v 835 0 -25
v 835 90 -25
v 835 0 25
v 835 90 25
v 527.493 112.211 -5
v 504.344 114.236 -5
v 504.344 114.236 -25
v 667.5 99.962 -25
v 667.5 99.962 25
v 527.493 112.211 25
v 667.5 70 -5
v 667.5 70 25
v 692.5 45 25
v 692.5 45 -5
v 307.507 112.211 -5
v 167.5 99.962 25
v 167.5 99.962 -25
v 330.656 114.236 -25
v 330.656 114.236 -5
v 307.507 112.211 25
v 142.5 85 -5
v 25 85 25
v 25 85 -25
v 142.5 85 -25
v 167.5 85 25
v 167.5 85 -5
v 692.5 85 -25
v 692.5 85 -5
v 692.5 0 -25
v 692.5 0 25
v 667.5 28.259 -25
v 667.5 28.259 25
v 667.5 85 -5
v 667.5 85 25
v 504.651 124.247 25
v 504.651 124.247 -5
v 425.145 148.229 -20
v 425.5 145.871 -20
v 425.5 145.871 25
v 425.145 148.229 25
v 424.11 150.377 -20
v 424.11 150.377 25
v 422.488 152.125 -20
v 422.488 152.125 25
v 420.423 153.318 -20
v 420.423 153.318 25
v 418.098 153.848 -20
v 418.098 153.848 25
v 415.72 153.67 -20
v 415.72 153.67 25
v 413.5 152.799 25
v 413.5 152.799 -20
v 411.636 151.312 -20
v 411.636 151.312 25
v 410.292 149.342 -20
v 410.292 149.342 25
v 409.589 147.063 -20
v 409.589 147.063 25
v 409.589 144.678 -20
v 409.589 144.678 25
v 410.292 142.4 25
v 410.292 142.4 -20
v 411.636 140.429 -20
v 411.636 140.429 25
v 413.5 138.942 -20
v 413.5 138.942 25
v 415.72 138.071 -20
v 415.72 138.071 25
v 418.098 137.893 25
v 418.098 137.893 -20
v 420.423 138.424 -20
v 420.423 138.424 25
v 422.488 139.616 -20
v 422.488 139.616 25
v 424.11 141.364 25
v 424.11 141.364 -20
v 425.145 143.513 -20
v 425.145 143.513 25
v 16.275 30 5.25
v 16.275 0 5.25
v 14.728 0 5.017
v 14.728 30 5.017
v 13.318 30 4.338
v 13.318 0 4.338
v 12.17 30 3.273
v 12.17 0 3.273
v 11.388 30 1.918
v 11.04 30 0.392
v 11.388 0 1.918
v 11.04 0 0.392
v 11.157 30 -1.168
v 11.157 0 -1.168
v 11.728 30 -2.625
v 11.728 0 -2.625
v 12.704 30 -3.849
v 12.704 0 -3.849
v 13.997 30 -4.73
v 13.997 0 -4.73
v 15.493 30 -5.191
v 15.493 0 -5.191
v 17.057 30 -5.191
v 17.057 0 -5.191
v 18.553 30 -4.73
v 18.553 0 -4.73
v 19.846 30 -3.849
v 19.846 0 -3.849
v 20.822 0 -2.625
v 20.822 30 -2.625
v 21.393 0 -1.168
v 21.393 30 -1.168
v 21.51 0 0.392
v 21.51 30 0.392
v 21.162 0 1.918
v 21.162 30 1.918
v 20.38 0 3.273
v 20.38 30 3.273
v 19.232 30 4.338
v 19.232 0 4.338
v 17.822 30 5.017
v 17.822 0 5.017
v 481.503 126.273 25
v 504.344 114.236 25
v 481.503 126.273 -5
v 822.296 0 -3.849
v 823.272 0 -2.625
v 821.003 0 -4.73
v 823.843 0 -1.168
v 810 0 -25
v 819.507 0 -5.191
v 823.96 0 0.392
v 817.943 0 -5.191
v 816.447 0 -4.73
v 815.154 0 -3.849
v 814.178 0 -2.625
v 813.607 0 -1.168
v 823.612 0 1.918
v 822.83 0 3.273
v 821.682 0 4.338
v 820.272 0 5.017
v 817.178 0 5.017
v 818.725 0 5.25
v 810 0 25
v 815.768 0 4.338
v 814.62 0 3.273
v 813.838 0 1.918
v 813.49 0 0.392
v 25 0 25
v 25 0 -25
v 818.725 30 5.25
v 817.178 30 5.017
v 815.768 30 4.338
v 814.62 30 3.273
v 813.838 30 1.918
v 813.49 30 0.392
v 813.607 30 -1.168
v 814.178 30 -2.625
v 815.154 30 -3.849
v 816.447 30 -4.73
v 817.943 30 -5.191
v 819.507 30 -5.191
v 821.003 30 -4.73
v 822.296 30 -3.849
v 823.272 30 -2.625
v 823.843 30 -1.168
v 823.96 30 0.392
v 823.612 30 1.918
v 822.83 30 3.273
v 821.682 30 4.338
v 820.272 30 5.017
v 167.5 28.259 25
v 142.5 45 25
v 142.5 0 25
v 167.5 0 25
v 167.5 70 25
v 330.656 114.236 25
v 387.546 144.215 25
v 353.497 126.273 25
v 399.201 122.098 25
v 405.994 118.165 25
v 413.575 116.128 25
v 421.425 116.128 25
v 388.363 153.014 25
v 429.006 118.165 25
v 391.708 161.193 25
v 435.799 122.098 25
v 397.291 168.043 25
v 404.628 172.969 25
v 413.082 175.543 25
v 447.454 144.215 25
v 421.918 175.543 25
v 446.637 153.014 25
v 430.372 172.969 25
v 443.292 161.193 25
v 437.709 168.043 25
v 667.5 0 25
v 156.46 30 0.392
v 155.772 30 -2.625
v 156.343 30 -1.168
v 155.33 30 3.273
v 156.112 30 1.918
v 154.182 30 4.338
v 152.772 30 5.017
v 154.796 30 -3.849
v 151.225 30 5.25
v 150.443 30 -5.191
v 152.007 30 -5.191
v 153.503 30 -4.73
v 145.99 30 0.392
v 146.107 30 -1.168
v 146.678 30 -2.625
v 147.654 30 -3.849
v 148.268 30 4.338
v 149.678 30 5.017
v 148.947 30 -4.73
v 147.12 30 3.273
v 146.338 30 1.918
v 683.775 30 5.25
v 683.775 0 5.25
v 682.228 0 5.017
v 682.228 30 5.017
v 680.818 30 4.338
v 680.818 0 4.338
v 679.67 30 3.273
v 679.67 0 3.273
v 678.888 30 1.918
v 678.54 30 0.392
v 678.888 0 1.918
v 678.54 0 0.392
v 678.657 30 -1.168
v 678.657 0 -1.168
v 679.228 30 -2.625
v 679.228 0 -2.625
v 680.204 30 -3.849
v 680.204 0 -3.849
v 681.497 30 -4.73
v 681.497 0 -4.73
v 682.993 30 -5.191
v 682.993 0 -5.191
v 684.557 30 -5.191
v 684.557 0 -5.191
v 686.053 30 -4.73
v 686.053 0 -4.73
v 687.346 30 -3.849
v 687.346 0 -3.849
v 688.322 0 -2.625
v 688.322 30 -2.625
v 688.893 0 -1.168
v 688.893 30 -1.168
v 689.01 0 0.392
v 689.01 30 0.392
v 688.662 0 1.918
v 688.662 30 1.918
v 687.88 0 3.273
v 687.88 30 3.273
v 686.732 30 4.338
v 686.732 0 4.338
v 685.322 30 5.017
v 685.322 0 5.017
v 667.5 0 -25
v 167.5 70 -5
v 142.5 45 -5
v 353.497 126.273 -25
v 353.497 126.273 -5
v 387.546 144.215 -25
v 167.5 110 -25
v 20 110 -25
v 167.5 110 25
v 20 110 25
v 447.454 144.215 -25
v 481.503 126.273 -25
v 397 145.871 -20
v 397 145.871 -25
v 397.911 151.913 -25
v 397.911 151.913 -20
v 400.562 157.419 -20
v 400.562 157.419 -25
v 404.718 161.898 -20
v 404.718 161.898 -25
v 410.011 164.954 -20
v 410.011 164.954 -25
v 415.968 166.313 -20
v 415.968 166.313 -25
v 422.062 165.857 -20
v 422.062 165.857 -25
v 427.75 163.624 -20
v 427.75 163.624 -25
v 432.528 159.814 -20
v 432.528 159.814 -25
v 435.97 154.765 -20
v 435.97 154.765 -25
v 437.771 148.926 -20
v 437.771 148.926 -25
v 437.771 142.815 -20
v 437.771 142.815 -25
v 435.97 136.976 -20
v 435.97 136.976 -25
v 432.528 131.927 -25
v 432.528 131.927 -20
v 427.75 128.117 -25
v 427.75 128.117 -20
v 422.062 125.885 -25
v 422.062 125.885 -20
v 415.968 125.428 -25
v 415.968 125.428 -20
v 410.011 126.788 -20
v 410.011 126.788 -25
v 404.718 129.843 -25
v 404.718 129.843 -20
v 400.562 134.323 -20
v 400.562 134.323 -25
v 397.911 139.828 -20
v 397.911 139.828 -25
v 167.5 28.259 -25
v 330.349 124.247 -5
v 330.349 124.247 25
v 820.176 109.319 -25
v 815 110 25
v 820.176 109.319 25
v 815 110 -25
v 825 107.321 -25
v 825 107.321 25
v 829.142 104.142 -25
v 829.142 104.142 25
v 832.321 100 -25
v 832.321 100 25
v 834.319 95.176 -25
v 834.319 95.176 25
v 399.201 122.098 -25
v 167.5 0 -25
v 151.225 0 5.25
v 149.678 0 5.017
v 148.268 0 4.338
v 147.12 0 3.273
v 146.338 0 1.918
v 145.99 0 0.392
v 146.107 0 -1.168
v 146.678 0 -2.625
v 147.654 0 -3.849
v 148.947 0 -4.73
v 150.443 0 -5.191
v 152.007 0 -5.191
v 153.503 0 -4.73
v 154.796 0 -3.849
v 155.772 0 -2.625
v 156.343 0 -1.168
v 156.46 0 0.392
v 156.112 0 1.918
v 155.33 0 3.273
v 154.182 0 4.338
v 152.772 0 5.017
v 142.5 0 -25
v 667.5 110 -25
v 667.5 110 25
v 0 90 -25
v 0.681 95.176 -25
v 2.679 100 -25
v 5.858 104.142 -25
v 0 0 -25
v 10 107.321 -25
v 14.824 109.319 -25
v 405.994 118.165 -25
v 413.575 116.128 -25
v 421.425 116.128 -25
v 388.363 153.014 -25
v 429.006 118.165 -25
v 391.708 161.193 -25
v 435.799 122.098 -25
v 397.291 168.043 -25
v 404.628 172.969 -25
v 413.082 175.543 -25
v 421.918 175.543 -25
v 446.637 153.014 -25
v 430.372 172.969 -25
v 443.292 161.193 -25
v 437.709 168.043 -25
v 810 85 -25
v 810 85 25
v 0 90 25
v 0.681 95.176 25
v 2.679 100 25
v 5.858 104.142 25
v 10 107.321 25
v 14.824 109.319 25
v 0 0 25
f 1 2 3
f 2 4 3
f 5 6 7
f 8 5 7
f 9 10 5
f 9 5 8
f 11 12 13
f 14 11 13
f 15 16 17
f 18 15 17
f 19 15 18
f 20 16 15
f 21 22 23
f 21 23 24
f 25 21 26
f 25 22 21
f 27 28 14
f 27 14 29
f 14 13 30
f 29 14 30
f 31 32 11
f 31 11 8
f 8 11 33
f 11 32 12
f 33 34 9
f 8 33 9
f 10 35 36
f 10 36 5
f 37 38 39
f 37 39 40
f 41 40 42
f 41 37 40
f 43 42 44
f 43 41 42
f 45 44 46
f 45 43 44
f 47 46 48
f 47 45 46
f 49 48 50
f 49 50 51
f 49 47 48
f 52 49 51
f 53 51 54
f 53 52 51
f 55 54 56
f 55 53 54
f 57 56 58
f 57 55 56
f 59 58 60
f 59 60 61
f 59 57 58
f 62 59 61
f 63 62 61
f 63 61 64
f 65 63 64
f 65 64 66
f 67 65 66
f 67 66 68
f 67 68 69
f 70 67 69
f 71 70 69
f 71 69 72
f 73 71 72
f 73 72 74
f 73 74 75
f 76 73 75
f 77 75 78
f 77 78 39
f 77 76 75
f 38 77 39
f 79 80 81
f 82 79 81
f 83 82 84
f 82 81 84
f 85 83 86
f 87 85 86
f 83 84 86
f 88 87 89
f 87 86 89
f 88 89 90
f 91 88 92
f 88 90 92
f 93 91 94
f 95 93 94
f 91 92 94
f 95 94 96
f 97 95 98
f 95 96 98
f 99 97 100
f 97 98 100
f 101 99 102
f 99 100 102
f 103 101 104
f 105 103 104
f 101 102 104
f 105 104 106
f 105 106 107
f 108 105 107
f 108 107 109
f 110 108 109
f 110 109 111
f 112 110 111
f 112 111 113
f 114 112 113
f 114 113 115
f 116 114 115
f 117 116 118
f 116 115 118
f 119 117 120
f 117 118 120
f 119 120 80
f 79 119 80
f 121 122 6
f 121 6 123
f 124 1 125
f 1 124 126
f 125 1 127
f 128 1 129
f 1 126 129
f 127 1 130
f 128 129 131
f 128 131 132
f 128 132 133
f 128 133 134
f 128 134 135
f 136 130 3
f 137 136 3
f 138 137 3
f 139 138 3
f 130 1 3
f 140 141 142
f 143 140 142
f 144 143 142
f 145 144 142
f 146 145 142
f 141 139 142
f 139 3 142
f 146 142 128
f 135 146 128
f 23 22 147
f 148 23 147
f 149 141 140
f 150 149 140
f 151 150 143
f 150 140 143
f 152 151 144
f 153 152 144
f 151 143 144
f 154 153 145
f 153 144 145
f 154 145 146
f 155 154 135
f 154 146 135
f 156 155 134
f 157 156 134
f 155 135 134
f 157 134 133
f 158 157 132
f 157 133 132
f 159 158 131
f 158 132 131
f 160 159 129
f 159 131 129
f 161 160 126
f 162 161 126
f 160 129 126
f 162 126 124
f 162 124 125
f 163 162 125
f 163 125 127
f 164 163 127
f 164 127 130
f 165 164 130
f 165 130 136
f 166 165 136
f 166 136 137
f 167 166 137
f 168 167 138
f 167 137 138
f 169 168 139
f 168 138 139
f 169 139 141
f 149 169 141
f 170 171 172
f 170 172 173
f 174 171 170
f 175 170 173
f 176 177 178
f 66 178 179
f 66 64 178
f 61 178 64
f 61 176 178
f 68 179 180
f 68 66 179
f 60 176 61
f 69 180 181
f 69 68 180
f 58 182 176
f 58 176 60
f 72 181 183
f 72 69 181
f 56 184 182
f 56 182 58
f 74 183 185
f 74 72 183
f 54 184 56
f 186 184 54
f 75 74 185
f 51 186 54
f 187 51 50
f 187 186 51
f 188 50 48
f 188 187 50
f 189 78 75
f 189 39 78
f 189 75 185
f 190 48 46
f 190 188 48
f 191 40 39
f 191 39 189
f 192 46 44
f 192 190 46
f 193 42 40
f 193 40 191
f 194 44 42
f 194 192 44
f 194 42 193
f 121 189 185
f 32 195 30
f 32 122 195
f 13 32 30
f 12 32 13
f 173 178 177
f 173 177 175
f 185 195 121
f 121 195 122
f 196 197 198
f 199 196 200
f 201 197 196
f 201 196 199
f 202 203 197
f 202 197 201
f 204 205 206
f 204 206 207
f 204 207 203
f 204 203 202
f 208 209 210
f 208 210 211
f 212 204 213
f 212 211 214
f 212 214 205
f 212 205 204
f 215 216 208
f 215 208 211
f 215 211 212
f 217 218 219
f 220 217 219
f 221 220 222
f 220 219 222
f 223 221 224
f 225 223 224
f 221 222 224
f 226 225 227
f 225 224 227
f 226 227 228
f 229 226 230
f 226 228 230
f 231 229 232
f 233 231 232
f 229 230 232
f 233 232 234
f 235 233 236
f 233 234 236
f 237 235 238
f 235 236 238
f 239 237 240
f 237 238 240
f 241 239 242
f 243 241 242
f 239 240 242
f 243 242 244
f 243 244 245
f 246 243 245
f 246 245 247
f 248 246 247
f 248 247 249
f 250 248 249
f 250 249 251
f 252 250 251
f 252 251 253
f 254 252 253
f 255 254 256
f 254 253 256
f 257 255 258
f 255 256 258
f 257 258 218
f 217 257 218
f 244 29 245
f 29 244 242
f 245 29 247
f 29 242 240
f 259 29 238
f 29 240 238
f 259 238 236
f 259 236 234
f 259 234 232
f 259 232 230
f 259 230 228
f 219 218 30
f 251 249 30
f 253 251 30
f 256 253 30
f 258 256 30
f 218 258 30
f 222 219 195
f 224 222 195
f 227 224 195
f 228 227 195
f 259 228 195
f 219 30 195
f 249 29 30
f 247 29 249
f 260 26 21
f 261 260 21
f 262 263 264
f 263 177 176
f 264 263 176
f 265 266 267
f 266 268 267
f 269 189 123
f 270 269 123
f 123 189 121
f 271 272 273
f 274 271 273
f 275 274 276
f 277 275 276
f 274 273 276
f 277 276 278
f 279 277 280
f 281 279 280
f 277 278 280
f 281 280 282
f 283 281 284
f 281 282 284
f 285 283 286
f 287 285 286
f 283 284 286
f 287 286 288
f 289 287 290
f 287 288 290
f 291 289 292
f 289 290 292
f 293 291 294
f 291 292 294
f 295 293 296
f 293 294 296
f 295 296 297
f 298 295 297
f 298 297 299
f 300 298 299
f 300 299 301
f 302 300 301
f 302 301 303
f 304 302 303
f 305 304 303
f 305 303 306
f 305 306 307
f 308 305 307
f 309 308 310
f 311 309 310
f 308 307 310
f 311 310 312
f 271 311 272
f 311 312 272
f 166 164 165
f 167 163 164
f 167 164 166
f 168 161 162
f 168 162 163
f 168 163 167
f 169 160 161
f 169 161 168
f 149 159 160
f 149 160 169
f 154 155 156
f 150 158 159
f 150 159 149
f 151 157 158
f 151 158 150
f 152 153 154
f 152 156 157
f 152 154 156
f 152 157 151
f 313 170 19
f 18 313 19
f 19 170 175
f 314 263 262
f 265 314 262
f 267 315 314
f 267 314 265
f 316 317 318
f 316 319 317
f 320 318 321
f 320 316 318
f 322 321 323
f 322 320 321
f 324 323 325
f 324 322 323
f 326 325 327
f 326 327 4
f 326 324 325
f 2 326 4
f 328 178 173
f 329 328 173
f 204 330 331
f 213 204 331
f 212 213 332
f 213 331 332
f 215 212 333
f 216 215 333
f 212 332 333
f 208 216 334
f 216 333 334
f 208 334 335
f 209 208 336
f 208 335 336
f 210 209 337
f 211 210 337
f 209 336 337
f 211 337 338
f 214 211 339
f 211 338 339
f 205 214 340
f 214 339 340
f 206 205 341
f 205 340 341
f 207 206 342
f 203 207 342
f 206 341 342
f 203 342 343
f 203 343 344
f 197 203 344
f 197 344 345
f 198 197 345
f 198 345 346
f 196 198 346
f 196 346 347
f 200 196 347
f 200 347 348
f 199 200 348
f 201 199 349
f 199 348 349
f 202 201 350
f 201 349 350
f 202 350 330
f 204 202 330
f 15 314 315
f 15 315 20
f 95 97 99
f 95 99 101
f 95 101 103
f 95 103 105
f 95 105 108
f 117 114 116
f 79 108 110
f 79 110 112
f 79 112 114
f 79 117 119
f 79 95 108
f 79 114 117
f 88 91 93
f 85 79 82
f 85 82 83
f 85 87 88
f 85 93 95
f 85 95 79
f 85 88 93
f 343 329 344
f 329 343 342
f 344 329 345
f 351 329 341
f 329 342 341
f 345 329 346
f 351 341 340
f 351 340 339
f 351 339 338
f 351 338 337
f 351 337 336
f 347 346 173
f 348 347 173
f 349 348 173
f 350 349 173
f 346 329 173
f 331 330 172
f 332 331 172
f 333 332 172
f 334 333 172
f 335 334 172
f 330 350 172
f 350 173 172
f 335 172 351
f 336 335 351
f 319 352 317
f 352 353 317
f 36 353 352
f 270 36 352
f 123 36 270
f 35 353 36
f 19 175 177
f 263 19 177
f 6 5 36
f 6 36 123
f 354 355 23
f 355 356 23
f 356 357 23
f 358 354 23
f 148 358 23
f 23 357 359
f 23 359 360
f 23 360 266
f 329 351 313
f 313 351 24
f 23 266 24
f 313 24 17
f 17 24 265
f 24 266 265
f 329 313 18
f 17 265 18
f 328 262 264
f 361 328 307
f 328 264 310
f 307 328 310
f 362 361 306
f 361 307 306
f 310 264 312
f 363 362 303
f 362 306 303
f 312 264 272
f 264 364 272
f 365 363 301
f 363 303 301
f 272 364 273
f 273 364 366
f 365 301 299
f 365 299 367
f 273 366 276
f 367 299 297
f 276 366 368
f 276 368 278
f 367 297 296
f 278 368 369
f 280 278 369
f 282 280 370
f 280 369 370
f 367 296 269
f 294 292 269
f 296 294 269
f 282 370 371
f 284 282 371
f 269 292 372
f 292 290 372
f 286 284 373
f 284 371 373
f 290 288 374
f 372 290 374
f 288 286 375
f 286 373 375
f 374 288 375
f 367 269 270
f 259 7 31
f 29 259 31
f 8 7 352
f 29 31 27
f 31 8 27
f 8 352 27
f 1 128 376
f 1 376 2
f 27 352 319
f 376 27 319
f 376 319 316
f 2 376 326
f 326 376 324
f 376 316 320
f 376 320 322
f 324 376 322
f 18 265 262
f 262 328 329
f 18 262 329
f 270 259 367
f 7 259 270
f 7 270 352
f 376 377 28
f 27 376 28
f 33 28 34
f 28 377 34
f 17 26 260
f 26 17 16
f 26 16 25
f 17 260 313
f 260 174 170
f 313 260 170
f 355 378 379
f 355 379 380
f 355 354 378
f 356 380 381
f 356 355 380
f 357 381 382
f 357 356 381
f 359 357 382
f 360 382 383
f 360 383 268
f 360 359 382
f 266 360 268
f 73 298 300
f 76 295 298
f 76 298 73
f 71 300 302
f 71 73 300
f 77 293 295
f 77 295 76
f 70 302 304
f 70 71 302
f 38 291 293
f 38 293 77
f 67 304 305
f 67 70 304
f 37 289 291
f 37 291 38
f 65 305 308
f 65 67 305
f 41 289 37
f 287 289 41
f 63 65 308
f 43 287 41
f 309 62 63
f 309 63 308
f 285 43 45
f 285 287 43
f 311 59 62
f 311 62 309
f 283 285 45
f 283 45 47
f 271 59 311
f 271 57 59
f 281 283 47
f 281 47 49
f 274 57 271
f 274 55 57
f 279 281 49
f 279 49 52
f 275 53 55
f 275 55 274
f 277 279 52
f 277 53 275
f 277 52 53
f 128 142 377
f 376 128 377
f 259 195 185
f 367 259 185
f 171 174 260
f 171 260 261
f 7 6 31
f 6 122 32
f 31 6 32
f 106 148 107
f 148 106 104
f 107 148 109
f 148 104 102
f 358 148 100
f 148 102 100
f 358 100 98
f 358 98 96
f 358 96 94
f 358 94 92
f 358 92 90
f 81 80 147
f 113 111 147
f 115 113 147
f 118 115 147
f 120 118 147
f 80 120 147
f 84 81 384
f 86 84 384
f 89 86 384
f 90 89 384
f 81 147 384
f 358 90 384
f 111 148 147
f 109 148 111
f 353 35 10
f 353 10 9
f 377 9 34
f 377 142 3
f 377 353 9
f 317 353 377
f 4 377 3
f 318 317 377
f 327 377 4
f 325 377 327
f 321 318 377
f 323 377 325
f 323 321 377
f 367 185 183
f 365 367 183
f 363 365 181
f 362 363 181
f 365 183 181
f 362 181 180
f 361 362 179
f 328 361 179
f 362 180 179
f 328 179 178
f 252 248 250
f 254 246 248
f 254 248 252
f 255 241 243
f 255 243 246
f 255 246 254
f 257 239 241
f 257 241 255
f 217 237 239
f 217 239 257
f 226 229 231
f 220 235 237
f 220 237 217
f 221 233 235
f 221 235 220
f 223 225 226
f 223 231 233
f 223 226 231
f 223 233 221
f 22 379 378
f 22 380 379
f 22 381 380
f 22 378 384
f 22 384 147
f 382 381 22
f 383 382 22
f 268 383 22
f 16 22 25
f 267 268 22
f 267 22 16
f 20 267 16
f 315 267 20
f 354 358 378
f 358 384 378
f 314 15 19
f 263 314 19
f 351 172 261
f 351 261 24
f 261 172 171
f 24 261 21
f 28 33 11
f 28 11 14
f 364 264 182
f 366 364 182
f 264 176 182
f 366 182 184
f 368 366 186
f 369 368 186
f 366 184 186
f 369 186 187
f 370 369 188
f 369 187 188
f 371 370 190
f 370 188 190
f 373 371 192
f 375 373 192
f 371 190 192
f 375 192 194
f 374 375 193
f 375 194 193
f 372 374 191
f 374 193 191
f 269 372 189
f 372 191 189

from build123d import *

# Parameters (mm, degrees)
SKETCH1_R           = 8
BOSS_EXTRUDE1_DEPTH = 25
CUT_EXTRUDE1_START  = 85
SKETCH2_R           = 5.25
CUT_EXTRUDE1_DEPTH  = 30
FILLET1_R           = 20
BOSS_EXTRUDE2_DEPTH = 50
CUT_EXTRUDE2_DEPTH  = 30
SKETCH5_R           = 20.5
CUT_EXTRUDE3_DEPTH  = 5


with BuildPart() as part:
    # Sketch1 → Boss-Extrude1 (new, symmetric)
    with BuildSketch(Plane.XY):
        with BuildLine():
            Line((25, 85), (25, 0))
            Line((25, 0), (0, 0))
            Line((0, 0), (0, 110))
            Line((0, 110), (167.5, 110))
            Line((167.5, 110), (167.5, 28.258760447))
            Line((167.5, 28.258760447), (387.545711729, 144.215139733))
            ThreePointArc((387.545711729, 144.215139733), (417.5, 175.870619777), (447.454288271, 144.215139733))
            Line((447.454288271, 144.215139733), (667.5, 28.258760447))
            Line((667.5, 28.258760447), (667.5, 110))
            Line((667.5, 110), (835, 110))
            Line((835, 110), (835, 0))
            Line((835, 0), (810, 0))
            Line((810, 0), (810, 85))
            Line((810, 85), (692.5, 85))
            Line((692.5, 85), (692.5, 0))
            Line((692.5, 0), (667.5, 0))
            Line((667.5, 0), (435.799385732, 122.098104516))
            ThreePointArc((435.799385732, 122.098104516), (417.5, 115.870619777), (399.200614268, 122.098104516))
            Line((399.200614268, 122.098104516), (167.5, 0))
            Line((167.5, 0), (142.5, 0))
            Line((142.5, 0), (142.5, 85))
            Line((142.5, 85), (25, 85))
        make_face()
        with Locations((417.5, 145.870619777)):
            Circle(SKETCH1_R, mode=Mode.SUBTRACT)
    extrude(amount=BOSS_EXTRUDE1_DEPTH, both=True)

    # Sketch2 → Cut-Extrude1 (cut)
    with BuildSketch(Plane.XZ.offset(-85).offset(CUT_EXTRUDE1_START)):
        with Locations(Location((16.275, 0, 0), (0, 0, 90))):
            Circle(SKETCH2_R)
        with Locations(Location((151.225, 0, 0), (0, 0, 90))):
            Circle(SKETCH2_R)
        with Locations(Location((683.775, 0, 0), (0, 0, 90))):
            Circle(SKETCH2_R)
        with Locations(Location((818.725, 0, 0), (0, 0, 90))):
            Circle(SKETCH2_R)
    extrude(amount=-CUT_EXTRUDE1_DEPTH, mode=Mode.SUBTRACT)

    # Fillet1
    fillet1_edges = [part.edges().sort_by_distance(p)[0] for p in [
        (0, 110, 0),
        (835, 110, 0),
    ]]
    fillet(fillet1_edges, radius=FILLET1_R)

    # Sketch3 → Boss-Extrude2 (add)
    with BuildSketch(Plane.XY.offset(25)):
        Polygon((353.496925298, 126.272622414), (167.5, 110), (167.5, 99.961801625), (330.655651498, 114.236071521), align=None)
        Polygon((667.5, 110), (481.503074702, 126.272622414), (504.344348502, 114.236071521), (667.5, 99.961801625), align=None)
    extrude(amount=-BOSS_EXTRUDE2_DEPTH)

    # Sketch4 → Cut-Extrude2 (cut)
    with BuildSketch(Plane.XY.offset(25)):
        Polygon((142.5, 85), (167.5, 85), (167.5, 70), (142.5, 45), align=None)
        Polygon((330.655651498, 114.236071521), (353.496925298, 126.272622414), (330.348569212, 124.247403677), (307.507295412, 112.210852784), align=None)
        Polygon((527.492704588, 112.210852784), (504.344348502, 114.236071521), (481.503074702, 126.272622414), (504.651430788, 124.247403677), align=None)
        Polygon((692.5, 45), (692.5, 85), (667.5, 85), (667.5, 70), align=None)
    extrude(amount=-CUT_EXTRUDE2_DEPTH, mode=Mode.SUBTRACT)

    # Sketch5 → Cut-Extrude3 (cut)
    with BuildSketch(Plane(origin=(0, 0, -25), x_dir=(-1, 0, 0), z_dir=(0, 0, -1))):
        with Locations((-417.5, 145.870619777)):
            Circle(SKETCH5_R)
    extrude(amount=-CUT_EXTRUDE3_DEPTH, mode=Mode.SUBTRACT)


solid = part.part
